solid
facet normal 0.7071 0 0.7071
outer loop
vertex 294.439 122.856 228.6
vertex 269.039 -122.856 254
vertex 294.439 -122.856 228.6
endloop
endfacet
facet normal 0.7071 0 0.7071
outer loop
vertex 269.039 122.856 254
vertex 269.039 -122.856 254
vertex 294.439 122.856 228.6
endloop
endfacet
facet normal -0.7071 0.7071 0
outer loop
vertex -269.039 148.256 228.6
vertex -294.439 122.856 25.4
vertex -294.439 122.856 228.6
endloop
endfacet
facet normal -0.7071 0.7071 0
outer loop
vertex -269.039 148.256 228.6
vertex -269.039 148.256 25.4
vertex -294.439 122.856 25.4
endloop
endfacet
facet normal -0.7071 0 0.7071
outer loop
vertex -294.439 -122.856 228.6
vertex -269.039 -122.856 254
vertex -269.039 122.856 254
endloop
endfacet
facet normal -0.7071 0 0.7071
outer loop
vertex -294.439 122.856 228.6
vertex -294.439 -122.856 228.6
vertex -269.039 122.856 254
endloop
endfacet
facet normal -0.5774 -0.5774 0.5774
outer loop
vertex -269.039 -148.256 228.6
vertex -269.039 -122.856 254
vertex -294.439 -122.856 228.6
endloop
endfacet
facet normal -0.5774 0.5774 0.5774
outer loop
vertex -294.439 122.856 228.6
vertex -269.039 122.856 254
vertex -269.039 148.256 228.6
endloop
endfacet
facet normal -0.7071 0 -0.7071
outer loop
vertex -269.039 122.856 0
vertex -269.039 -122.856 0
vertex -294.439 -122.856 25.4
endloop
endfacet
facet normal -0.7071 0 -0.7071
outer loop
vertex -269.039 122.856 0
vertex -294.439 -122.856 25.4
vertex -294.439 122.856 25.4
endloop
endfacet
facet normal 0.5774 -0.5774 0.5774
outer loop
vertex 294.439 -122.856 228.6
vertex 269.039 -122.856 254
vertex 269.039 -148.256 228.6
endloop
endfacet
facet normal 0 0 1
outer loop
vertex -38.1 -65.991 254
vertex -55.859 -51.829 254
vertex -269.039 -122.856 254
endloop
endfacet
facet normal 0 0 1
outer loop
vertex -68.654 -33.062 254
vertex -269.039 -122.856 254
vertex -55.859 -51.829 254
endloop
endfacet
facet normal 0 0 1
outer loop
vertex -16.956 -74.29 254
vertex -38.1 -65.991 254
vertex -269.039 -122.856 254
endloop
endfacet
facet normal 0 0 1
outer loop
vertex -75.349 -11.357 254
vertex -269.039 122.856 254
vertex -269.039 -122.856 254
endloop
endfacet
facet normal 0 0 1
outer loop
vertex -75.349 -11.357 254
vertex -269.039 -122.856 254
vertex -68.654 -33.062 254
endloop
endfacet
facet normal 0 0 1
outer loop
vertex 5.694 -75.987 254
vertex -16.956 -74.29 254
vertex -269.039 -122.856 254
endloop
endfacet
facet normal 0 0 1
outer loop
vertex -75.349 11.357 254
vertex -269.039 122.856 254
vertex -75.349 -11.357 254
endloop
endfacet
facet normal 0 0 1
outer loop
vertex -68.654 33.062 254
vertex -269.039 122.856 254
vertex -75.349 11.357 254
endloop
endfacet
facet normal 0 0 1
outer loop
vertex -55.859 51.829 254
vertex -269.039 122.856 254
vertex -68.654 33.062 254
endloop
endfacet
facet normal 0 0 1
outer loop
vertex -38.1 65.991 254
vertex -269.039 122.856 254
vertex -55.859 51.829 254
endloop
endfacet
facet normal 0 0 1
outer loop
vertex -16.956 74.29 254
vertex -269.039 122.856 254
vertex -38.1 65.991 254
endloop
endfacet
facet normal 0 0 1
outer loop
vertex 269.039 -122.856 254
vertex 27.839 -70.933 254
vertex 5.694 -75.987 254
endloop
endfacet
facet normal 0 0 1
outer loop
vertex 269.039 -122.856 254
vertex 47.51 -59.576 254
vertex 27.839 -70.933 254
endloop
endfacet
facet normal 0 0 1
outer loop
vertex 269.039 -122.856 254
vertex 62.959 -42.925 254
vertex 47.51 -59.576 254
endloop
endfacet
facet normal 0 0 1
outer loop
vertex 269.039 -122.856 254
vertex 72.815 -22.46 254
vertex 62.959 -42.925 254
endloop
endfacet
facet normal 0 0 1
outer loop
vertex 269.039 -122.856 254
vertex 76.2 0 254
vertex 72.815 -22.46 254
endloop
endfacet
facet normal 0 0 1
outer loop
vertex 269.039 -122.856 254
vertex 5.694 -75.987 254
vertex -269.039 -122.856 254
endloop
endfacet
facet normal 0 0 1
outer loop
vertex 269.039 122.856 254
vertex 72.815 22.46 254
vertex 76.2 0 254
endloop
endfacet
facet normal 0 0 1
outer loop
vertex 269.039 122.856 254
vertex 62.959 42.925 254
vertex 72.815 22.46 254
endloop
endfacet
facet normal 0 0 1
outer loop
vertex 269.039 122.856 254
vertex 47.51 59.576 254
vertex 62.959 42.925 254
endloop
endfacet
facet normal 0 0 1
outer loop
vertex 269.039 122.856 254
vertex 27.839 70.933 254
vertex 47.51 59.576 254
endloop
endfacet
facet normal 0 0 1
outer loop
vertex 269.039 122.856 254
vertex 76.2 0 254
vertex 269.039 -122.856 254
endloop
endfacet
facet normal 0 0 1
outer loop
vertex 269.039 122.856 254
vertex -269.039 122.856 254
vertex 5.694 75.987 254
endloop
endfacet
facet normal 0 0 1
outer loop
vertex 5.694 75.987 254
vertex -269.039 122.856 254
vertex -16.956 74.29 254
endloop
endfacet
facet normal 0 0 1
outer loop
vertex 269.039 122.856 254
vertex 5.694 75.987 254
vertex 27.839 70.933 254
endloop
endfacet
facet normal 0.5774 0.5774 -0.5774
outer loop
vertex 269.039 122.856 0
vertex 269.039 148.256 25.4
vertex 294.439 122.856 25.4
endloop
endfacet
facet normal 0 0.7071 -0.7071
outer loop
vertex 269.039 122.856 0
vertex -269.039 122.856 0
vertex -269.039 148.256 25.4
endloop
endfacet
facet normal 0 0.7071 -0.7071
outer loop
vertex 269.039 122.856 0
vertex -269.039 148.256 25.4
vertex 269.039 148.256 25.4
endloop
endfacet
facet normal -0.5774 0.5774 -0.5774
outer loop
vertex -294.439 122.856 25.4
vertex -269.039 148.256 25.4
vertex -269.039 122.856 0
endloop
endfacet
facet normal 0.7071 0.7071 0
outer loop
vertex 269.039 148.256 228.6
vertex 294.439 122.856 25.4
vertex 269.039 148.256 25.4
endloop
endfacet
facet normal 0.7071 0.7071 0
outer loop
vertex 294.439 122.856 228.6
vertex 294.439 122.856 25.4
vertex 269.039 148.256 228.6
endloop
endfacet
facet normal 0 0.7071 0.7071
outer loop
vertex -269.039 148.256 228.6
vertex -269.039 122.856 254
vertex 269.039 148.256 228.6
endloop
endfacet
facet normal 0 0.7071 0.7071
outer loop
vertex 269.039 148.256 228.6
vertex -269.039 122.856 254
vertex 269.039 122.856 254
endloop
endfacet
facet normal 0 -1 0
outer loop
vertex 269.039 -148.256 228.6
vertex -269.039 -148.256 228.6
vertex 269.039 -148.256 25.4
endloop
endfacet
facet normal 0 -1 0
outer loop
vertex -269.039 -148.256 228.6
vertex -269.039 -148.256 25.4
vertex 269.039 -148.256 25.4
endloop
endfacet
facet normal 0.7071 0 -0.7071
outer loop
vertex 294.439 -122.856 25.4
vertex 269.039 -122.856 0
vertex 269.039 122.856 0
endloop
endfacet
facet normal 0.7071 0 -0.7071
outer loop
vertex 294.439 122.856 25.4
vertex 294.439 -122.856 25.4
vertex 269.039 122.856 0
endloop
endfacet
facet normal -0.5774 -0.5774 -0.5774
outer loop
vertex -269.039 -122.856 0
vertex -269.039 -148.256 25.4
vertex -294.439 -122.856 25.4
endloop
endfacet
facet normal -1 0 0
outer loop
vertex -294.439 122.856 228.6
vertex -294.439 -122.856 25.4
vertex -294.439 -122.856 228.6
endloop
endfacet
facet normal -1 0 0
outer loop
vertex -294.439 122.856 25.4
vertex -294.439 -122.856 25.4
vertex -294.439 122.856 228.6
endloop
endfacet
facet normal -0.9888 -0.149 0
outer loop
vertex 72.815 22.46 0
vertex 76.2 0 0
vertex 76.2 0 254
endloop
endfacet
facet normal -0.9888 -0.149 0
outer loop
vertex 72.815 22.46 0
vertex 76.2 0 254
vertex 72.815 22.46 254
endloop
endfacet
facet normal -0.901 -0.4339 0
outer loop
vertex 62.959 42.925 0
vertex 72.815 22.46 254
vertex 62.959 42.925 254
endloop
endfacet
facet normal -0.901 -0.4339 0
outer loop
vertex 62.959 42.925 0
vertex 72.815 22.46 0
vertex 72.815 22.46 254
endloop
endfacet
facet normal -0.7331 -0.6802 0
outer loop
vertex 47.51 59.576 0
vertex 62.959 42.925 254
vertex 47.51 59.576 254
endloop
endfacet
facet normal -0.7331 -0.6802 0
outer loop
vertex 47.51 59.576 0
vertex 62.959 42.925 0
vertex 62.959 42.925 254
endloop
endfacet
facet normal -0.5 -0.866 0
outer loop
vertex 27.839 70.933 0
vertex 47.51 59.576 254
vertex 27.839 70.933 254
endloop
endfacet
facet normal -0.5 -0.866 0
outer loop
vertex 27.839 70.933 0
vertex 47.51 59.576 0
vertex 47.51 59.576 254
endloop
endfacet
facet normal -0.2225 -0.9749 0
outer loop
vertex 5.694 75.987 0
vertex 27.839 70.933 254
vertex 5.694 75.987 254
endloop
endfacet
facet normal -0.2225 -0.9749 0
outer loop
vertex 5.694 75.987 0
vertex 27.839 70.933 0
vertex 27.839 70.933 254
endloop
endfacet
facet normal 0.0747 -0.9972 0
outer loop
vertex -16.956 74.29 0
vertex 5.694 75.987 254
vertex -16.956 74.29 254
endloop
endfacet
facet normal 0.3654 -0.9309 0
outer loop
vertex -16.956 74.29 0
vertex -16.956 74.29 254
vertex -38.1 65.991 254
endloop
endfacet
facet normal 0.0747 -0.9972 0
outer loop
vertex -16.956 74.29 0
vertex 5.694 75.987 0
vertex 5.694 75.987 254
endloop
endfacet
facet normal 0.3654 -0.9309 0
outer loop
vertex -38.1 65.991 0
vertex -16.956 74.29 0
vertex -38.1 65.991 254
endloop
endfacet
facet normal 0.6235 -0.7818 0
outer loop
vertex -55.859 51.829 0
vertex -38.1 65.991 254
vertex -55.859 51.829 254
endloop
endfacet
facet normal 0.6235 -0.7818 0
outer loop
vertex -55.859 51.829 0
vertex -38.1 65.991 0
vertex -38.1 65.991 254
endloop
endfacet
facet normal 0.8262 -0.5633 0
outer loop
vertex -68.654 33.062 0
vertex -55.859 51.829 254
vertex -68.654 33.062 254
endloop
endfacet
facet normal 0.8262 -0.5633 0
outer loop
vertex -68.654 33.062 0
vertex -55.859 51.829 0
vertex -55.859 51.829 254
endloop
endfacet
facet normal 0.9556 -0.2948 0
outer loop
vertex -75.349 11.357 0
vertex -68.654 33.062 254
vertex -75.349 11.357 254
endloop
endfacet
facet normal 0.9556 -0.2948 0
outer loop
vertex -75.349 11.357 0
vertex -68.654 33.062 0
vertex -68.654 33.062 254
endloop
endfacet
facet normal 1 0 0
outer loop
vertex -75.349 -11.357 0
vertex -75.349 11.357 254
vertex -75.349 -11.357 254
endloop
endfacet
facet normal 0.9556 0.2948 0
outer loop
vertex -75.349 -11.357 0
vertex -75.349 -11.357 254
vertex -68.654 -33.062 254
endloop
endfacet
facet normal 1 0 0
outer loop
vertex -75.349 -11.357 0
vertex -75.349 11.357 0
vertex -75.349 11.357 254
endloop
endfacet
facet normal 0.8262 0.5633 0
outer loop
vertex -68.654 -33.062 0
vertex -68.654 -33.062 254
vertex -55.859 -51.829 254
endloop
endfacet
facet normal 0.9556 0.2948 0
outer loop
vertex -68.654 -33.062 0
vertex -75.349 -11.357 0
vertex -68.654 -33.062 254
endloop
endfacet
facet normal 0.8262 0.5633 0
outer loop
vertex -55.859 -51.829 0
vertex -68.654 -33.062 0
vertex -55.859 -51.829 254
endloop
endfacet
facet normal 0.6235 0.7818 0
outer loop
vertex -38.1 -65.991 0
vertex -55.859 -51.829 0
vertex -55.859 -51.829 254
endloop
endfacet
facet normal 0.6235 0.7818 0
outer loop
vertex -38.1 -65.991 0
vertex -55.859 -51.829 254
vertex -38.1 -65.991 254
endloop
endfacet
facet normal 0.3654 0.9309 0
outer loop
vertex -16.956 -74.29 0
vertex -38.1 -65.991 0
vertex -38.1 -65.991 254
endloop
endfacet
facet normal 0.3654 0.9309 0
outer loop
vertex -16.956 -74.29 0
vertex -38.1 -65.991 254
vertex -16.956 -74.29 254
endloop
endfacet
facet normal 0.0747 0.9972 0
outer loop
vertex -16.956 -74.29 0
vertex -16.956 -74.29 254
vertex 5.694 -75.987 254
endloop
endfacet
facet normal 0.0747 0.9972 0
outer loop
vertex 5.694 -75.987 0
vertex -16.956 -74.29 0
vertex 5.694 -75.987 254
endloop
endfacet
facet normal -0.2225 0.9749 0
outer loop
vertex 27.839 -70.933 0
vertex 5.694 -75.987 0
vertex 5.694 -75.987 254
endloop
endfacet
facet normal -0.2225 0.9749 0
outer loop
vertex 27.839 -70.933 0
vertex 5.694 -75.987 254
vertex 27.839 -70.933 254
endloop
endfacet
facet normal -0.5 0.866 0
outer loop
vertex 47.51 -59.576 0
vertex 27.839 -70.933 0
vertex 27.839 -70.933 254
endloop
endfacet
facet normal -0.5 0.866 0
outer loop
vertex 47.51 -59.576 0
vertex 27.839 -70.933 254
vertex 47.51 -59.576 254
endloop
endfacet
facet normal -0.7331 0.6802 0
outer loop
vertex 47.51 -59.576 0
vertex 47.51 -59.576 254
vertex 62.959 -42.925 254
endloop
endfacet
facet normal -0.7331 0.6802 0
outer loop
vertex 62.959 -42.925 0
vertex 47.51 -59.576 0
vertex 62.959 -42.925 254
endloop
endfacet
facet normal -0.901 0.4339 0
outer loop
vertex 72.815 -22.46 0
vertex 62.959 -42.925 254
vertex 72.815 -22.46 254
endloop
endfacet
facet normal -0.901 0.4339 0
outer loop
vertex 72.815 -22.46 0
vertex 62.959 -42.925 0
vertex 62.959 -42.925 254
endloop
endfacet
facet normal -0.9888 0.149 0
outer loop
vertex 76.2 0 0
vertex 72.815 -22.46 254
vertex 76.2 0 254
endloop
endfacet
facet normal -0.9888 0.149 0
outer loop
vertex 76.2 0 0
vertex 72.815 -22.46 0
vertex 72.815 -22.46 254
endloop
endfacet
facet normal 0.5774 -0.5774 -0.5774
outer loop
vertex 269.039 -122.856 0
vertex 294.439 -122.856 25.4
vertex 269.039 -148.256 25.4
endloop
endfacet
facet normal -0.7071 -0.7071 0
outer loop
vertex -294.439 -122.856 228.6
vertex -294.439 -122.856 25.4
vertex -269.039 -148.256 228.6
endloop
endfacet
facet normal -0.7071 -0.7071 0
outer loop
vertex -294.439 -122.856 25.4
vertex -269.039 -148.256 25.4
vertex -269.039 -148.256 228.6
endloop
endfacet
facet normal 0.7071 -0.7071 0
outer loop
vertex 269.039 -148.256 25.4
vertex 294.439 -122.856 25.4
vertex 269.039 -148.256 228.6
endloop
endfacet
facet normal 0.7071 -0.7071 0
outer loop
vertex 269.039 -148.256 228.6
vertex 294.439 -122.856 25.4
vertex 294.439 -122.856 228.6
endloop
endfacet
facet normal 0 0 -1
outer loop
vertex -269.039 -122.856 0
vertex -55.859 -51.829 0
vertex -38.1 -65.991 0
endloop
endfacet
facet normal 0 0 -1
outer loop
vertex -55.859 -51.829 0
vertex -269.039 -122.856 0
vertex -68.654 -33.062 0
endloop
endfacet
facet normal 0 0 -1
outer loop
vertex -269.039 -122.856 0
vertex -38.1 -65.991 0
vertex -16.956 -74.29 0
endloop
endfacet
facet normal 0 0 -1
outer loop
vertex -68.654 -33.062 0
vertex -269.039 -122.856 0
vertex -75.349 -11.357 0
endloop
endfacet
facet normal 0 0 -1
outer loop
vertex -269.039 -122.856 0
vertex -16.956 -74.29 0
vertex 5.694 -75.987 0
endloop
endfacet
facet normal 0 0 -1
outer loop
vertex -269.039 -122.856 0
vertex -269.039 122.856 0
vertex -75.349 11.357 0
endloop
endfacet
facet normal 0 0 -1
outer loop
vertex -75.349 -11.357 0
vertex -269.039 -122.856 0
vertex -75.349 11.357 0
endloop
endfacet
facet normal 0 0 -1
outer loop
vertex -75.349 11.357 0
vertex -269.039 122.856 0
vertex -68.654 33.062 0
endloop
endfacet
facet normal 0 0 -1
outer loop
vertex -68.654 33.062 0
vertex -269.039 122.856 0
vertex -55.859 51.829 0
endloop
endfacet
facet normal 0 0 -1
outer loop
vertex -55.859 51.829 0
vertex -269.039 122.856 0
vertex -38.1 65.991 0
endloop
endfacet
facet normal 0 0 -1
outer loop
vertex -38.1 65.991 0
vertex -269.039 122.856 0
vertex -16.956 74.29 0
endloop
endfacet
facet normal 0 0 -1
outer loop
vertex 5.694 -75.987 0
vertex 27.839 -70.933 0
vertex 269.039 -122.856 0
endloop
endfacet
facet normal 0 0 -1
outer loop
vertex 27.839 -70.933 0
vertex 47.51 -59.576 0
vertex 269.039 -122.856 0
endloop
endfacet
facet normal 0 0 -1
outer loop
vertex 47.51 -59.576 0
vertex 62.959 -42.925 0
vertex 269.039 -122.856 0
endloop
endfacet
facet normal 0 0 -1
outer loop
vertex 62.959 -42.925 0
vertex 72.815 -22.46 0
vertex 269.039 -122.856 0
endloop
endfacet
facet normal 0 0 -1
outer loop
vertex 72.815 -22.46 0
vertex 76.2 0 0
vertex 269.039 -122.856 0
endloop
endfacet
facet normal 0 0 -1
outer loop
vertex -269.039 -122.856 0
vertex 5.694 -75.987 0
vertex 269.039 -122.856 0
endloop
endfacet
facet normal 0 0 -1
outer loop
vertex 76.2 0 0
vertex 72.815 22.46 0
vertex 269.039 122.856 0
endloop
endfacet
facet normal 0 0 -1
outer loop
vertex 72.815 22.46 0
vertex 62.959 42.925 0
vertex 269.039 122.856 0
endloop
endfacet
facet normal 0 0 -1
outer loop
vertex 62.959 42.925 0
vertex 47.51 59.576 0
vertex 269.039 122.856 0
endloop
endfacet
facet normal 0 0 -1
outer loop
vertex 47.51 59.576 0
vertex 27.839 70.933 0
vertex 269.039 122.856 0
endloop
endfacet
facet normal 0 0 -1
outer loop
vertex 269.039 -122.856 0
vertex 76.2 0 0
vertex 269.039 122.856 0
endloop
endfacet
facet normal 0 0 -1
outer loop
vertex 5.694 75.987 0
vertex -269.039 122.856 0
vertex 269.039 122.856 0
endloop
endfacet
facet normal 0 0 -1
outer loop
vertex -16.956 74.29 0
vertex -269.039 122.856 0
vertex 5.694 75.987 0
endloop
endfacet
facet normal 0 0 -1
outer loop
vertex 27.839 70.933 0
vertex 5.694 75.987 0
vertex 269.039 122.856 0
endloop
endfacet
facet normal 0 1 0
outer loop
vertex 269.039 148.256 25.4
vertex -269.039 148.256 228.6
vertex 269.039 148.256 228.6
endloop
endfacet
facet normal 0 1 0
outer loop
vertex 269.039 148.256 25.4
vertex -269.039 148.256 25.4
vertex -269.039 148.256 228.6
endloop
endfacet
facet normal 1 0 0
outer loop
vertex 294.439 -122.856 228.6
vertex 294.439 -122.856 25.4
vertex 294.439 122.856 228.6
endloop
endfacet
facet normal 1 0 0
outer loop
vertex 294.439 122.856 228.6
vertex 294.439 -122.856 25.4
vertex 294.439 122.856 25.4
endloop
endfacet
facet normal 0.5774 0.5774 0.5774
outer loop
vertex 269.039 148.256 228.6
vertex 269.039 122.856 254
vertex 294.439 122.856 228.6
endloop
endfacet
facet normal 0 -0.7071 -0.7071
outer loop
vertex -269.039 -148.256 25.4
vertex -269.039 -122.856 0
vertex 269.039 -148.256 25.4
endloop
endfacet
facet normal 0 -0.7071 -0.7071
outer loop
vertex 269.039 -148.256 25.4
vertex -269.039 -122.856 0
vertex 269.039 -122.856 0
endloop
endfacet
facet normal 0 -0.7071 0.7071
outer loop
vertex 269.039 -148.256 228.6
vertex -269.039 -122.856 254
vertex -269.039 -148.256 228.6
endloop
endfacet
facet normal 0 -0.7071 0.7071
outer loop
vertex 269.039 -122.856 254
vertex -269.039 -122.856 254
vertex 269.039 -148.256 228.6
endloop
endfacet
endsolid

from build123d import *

# Parameters (mm, degrees)
F0_W     = 588.878934
F0_H     = 296.51298
F0_R     = 76.2
F1_DEPTH = 254
F2_SIZE  = 25.4


with BuildPart() as f1:
    # F0 (on Top) → F1 (new body)
    with BuildSketch(Plane.XY):
        Rectangle(F0_W, F0_H)
        Circle(F0_R, mode=Mode.SUBTRACT)
    extrude(amount=F1_DEPTH)

    # F2
    f2_edges = [f1.edges().sort_by_distance(p)[0] for p in [
        (0, -148.25649, 254),
        (294.439467, 0, 254),
        (0, 148.25649, 254),
        (-294.439467, 0, 254),
        (294.439467, 148.25649, 127),
        (294.439467, -148.25649, 127),
        (-294.439467, -148.25649, 127),
        (-294.439467, 148.25649, 127),
        (0, 148.25649, 0),
        (294.439467, 0, 0),
        (0, -148.25649, 0),
        (-294.439467, 0, 0),
    ]]
    chamfer(f2_edges, length=F2_SIZE)


solid = f1.part
